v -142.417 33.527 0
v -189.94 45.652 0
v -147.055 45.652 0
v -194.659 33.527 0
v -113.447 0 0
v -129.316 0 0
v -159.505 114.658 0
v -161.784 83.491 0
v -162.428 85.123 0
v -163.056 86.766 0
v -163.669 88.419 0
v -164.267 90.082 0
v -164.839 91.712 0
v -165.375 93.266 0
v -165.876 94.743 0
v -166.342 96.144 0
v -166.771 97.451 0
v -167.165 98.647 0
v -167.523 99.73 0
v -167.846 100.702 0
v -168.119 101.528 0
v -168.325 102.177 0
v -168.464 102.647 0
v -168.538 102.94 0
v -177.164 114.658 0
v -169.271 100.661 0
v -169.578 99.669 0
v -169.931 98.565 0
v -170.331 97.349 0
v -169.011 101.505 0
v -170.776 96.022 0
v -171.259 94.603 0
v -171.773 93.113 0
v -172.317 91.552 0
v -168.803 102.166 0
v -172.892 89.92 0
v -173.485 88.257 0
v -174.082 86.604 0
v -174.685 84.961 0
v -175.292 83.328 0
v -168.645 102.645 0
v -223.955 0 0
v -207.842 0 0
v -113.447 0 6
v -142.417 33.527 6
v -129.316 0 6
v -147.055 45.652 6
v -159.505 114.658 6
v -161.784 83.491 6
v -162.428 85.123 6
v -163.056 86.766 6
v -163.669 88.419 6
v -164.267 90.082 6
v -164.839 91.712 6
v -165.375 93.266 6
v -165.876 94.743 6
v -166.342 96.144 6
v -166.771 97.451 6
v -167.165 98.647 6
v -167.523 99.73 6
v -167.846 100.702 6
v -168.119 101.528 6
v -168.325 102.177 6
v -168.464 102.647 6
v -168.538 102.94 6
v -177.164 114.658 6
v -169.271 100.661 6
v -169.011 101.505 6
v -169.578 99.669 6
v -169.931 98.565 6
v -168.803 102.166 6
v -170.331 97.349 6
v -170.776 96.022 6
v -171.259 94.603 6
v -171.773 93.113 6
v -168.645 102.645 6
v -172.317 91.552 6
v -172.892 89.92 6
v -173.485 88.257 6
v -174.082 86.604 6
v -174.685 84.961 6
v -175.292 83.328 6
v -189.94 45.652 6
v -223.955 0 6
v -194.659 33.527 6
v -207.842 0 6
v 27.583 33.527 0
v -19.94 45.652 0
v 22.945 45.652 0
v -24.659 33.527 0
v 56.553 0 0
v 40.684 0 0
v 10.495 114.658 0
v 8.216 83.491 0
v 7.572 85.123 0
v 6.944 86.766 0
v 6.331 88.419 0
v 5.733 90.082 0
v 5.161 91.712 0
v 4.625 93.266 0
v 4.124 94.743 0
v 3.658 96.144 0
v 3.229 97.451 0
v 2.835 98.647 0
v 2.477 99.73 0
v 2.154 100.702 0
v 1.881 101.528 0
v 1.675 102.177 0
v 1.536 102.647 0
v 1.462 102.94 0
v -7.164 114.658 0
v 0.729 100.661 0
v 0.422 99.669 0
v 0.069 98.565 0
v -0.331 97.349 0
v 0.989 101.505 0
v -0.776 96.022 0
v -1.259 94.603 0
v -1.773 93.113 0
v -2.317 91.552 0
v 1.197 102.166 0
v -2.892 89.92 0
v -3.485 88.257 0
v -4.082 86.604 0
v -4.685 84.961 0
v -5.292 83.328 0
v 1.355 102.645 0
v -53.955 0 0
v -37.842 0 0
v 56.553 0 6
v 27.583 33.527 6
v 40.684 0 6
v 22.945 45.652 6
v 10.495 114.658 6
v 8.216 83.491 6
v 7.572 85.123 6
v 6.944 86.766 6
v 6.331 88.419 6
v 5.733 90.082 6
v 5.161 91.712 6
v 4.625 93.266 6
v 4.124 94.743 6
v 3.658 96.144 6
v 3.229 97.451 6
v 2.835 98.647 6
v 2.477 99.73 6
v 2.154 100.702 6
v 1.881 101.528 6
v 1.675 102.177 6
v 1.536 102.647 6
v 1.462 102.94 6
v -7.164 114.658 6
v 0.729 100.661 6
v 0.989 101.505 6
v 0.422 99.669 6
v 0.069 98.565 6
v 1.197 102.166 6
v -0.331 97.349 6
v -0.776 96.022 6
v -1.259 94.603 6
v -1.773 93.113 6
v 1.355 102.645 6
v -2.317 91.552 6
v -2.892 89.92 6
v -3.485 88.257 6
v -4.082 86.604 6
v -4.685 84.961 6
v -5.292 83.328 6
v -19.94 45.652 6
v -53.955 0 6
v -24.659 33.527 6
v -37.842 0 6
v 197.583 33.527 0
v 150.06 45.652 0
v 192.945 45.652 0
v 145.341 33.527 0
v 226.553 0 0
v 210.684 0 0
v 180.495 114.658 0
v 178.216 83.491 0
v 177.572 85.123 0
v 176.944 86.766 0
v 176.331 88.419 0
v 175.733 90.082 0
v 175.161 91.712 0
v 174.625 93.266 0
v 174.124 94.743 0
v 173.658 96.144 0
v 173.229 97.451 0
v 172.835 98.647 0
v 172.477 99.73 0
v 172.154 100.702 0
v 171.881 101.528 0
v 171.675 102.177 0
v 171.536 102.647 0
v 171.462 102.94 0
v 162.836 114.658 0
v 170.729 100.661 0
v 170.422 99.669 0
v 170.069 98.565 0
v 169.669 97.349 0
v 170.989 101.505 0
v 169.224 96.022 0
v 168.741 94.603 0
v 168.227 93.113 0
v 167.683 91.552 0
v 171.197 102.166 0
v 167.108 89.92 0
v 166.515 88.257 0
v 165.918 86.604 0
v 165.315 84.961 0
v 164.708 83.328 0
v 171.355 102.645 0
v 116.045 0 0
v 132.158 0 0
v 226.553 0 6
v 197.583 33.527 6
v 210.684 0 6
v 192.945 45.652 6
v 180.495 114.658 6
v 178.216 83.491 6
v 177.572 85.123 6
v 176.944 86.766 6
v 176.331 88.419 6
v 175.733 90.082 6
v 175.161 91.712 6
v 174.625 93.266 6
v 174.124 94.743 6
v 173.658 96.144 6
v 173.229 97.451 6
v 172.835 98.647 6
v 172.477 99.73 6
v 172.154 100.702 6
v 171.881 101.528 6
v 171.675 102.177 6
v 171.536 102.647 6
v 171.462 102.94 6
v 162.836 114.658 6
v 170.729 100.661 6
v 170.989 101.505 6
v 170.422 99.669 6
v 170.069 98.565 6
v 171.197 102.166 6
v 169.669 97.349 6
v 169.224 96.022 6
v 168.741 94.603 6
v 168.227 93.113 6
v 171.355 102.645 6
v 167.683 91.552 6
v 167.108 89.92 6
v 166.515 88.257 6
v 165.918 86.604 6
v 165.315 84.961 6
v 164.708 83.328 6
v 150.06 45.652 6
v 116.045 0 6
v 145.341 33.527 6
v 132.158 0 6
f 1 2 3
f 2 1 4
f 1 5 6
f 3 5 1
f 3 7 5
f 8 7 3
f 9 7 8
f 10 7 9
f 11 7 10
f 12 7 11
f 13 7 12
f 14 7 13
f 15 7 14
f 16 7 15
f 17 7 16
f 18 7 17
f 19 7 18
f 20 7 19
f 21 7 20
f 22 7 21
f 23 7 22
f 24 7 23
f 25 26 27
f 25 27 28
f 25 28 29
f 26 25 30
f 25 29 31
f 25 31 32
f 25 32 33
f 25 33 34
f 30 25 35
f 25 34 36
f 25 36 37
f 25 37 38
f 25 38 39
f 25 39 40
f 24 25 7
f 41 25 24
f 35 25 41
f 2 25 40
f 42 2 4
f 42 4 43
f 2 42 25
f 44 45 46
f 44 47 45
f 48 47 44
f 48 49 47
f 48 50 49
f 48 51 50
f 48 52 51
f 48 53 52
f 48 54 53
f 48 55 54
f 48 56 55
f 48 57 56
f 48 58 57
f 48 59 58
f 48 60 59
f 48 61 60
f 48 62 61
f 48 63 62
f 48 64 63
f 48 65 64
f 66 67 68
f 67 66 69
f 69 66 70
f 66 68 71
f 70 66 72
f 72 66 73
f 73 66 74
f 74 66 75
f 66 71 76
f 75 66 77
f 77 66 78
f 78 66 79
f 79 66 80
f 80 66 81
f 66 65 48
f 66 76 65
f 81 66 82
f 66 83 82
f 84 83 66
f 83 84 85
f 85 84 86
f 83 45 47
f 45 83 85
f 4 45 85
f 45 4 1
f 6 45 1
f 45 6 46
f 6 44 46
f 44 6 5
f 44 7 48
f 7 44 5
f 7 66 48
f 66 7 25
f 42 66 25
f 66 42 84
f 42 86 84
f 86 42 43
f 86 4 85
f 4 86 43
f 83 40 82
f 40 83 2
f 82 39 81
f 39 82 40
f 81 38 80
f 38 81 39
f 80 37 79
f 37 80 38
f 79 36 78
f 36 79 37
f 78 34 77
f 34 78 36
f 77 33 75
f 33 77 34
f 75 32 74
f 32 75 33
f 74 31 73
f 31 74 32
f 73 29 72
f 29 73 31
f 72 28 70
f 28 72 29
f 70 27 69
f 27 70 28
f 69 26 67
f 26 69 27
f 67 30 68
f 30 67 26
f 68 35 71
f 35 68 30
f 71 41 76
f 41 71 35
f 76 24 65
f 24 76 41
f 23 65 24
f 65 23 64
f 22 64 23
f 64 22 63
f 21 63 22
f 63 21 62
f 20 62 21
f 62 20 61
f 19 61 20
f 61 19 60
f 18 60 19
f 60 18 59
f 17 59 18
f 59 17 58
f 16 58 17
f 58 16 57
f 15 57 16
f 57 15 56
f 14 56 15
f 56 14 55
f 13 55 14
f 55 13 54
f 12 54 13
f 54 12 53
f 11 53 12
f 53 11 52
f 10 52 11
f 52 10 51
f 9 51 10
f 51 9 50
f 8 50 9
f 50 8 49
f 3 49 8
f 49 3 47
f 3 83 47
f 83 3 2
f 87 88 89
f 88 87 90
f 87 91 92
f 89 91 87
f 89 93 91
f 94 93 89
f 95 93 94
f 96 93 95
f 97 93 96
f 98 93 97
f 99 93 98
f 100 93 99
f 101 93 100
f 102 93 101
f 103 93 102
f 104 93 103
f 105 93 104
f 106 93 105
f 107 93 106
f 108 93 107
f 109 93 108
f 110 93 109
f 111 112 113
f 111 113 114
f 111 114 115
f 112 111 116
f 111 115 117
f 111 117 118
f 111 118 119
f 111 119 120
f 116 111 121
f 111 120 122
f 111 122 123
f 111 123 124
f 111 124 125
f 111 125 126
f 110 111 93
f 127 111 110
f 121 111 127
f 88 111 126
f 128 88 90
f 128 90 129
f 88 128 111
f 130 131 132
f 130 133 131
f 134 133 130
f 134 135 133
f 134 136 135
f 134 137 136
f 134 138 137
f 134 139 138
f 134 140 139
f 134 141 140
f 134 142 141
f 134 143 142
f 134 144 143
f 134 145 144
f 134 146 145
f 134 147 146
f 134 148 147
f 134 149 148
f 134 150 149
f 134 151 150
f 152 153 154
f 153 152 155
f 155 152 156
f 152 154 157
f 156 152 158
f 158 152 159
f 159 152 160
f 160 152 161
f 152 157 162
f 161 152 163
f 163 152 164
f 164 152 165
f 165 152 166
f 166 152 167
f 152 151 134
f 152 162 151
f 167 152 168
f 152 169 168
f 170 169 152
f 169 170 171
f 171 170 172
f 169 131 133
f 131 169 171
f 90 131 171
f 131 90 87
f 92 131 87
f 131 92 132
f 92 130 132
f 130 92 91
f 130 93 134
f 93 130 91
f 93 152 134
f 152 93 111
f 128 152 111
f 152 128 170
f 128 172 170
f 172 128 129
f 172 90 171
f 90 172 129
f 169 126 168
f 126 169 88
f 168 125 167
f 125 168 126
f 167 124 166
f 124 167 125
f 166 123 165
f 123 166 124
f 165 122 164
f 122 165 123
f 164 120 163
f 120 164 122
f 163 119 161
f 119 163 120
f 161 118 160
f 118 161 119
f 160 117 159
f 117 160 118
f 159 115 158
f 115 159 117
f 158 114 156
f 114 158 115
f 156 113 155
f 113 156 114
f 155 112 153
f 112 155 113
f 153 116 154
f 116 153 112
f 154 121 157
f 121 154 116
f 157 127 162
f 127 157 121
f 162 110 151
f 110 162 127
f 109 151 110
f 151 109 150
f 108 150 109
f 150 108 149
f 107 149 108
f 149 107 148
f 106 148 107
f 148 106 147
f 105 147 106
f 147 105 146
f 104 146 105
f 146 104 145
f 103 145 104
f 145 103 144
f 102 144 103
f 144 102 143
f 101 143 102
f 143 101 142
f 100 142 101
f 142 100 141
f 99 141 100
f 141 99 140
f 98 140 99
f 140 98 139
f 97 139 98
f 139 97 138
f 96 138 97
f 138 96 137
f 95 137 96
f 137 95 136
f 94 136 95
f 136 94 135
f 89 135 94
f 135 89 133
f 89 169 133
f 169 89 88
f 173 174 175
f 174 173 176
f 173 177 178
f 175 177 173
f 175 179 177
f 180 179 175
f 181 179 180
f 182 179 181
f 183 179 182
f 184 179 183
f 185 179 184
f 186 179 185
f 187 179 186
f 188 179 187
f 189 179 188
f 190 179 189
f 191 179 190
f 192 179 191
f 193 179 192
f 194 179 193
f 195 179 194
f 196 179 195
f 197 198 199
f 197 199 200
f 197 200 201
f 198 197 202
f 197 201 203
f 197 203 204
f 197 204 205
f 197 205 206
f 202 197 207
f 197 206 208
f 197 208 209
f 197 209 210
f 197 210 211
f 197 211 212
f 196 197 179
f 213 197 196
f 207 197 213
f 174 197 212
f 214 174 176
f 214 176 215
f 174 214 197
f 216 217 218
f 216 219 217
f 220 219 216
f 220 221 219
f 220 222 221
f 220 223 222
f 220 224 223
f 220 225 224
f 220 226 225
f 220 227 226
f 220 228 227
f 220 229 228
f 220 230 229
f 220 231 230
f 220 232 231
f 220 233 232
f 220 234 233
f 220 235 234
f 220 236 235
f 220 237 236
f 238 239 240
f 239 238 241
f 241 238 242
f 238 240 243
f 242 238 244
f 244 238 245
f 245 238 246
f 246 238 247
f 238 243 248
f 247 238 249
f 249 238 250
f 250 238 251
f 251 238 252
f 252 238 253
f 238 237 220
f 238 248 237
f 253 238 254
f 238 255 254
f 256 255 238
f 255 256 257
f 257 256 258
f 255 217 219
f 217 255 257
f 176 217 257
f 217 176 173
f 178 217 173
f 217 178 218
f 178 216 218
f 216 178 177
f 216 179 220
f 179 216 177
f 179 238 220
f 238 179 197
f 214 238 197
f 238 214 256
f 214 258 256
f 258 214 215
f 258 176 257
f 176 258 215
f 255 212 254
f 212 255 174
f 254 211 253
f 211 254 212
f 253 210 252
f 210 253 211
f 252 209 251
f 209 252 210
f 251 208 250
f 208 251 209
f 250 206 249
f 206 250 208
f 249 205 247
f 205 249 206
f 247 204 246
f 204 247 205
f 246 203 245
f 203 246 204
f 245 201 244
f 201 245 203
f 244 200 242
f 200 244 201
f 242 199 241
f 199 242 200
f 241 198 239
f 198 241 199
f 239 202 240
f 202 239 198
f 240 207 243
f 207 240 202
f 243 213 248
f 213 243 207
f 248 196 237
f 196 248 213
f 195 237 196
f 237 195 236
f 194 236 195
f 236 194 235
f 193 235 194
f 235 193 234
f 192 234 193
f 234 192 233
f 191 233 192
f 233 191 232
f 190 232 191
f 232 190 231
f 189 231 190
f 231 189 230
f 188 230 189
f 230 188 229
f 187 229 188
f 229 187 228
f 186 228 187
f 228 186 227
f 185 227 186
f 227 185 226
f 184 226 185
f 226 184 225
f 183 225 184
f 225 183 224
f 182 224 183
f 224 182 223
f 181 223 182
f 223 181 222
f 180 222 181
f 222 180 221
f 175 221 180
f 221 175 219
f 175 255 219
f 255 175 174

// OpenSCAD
//////////////////////////////////////////////////////////////////////
// LibFile: glyph_comparison.scad
// Project: Glyph Dossier
// FileGroup: Executable Workbench
// FileSummary: Same glyph across three configured font sources.
//////////////////////////////////////////////////////////////////////

/* [Character] */
glyph_id_selected = "U_A";

/* [Source 1] */
source_1_label = "Source 1";
source_1_font_name = "";
source_1_license = "unrecorded";
source_1_url = "";
source_1_revision = "";

/* [Source 2] */
source_2_label = "Source 2";
source_2_font_name = "";
source_2_license = "unrecorded";
source_2_url = "";
source_2_revision = "";

/* [Source 3] */
source_3_label = "Source 3";
source_3_font_name = "";
source_3_license = "unrecorded";
source_3_url = "";
source_3_revision = "";


/* [Comparison order] */
compare_source_1_id = "SRC_1"; // [SRC_1,SRC_2,SRC_3]
compare_source_2_id = "SRC_2"; // [SRC_1,SRC_2,SRC_3]
compare_source_3_id = "SRC_3"; // [SRC_1,SRC_2,SRC_3]
comparison_spacing = 170;

/* [Profile] */
nominal_size = 120;
extrusion_depth = 6;

/* [Hidden] */
workbench_name = "glyph_comparison";
project_name_selected = "GLYPH_DOSSIER_LAB";
source_id_selected = "SRC_1";
render_mode = "comparison";
report_level = "full";
source_kind = "font";

include <../main.scad>
